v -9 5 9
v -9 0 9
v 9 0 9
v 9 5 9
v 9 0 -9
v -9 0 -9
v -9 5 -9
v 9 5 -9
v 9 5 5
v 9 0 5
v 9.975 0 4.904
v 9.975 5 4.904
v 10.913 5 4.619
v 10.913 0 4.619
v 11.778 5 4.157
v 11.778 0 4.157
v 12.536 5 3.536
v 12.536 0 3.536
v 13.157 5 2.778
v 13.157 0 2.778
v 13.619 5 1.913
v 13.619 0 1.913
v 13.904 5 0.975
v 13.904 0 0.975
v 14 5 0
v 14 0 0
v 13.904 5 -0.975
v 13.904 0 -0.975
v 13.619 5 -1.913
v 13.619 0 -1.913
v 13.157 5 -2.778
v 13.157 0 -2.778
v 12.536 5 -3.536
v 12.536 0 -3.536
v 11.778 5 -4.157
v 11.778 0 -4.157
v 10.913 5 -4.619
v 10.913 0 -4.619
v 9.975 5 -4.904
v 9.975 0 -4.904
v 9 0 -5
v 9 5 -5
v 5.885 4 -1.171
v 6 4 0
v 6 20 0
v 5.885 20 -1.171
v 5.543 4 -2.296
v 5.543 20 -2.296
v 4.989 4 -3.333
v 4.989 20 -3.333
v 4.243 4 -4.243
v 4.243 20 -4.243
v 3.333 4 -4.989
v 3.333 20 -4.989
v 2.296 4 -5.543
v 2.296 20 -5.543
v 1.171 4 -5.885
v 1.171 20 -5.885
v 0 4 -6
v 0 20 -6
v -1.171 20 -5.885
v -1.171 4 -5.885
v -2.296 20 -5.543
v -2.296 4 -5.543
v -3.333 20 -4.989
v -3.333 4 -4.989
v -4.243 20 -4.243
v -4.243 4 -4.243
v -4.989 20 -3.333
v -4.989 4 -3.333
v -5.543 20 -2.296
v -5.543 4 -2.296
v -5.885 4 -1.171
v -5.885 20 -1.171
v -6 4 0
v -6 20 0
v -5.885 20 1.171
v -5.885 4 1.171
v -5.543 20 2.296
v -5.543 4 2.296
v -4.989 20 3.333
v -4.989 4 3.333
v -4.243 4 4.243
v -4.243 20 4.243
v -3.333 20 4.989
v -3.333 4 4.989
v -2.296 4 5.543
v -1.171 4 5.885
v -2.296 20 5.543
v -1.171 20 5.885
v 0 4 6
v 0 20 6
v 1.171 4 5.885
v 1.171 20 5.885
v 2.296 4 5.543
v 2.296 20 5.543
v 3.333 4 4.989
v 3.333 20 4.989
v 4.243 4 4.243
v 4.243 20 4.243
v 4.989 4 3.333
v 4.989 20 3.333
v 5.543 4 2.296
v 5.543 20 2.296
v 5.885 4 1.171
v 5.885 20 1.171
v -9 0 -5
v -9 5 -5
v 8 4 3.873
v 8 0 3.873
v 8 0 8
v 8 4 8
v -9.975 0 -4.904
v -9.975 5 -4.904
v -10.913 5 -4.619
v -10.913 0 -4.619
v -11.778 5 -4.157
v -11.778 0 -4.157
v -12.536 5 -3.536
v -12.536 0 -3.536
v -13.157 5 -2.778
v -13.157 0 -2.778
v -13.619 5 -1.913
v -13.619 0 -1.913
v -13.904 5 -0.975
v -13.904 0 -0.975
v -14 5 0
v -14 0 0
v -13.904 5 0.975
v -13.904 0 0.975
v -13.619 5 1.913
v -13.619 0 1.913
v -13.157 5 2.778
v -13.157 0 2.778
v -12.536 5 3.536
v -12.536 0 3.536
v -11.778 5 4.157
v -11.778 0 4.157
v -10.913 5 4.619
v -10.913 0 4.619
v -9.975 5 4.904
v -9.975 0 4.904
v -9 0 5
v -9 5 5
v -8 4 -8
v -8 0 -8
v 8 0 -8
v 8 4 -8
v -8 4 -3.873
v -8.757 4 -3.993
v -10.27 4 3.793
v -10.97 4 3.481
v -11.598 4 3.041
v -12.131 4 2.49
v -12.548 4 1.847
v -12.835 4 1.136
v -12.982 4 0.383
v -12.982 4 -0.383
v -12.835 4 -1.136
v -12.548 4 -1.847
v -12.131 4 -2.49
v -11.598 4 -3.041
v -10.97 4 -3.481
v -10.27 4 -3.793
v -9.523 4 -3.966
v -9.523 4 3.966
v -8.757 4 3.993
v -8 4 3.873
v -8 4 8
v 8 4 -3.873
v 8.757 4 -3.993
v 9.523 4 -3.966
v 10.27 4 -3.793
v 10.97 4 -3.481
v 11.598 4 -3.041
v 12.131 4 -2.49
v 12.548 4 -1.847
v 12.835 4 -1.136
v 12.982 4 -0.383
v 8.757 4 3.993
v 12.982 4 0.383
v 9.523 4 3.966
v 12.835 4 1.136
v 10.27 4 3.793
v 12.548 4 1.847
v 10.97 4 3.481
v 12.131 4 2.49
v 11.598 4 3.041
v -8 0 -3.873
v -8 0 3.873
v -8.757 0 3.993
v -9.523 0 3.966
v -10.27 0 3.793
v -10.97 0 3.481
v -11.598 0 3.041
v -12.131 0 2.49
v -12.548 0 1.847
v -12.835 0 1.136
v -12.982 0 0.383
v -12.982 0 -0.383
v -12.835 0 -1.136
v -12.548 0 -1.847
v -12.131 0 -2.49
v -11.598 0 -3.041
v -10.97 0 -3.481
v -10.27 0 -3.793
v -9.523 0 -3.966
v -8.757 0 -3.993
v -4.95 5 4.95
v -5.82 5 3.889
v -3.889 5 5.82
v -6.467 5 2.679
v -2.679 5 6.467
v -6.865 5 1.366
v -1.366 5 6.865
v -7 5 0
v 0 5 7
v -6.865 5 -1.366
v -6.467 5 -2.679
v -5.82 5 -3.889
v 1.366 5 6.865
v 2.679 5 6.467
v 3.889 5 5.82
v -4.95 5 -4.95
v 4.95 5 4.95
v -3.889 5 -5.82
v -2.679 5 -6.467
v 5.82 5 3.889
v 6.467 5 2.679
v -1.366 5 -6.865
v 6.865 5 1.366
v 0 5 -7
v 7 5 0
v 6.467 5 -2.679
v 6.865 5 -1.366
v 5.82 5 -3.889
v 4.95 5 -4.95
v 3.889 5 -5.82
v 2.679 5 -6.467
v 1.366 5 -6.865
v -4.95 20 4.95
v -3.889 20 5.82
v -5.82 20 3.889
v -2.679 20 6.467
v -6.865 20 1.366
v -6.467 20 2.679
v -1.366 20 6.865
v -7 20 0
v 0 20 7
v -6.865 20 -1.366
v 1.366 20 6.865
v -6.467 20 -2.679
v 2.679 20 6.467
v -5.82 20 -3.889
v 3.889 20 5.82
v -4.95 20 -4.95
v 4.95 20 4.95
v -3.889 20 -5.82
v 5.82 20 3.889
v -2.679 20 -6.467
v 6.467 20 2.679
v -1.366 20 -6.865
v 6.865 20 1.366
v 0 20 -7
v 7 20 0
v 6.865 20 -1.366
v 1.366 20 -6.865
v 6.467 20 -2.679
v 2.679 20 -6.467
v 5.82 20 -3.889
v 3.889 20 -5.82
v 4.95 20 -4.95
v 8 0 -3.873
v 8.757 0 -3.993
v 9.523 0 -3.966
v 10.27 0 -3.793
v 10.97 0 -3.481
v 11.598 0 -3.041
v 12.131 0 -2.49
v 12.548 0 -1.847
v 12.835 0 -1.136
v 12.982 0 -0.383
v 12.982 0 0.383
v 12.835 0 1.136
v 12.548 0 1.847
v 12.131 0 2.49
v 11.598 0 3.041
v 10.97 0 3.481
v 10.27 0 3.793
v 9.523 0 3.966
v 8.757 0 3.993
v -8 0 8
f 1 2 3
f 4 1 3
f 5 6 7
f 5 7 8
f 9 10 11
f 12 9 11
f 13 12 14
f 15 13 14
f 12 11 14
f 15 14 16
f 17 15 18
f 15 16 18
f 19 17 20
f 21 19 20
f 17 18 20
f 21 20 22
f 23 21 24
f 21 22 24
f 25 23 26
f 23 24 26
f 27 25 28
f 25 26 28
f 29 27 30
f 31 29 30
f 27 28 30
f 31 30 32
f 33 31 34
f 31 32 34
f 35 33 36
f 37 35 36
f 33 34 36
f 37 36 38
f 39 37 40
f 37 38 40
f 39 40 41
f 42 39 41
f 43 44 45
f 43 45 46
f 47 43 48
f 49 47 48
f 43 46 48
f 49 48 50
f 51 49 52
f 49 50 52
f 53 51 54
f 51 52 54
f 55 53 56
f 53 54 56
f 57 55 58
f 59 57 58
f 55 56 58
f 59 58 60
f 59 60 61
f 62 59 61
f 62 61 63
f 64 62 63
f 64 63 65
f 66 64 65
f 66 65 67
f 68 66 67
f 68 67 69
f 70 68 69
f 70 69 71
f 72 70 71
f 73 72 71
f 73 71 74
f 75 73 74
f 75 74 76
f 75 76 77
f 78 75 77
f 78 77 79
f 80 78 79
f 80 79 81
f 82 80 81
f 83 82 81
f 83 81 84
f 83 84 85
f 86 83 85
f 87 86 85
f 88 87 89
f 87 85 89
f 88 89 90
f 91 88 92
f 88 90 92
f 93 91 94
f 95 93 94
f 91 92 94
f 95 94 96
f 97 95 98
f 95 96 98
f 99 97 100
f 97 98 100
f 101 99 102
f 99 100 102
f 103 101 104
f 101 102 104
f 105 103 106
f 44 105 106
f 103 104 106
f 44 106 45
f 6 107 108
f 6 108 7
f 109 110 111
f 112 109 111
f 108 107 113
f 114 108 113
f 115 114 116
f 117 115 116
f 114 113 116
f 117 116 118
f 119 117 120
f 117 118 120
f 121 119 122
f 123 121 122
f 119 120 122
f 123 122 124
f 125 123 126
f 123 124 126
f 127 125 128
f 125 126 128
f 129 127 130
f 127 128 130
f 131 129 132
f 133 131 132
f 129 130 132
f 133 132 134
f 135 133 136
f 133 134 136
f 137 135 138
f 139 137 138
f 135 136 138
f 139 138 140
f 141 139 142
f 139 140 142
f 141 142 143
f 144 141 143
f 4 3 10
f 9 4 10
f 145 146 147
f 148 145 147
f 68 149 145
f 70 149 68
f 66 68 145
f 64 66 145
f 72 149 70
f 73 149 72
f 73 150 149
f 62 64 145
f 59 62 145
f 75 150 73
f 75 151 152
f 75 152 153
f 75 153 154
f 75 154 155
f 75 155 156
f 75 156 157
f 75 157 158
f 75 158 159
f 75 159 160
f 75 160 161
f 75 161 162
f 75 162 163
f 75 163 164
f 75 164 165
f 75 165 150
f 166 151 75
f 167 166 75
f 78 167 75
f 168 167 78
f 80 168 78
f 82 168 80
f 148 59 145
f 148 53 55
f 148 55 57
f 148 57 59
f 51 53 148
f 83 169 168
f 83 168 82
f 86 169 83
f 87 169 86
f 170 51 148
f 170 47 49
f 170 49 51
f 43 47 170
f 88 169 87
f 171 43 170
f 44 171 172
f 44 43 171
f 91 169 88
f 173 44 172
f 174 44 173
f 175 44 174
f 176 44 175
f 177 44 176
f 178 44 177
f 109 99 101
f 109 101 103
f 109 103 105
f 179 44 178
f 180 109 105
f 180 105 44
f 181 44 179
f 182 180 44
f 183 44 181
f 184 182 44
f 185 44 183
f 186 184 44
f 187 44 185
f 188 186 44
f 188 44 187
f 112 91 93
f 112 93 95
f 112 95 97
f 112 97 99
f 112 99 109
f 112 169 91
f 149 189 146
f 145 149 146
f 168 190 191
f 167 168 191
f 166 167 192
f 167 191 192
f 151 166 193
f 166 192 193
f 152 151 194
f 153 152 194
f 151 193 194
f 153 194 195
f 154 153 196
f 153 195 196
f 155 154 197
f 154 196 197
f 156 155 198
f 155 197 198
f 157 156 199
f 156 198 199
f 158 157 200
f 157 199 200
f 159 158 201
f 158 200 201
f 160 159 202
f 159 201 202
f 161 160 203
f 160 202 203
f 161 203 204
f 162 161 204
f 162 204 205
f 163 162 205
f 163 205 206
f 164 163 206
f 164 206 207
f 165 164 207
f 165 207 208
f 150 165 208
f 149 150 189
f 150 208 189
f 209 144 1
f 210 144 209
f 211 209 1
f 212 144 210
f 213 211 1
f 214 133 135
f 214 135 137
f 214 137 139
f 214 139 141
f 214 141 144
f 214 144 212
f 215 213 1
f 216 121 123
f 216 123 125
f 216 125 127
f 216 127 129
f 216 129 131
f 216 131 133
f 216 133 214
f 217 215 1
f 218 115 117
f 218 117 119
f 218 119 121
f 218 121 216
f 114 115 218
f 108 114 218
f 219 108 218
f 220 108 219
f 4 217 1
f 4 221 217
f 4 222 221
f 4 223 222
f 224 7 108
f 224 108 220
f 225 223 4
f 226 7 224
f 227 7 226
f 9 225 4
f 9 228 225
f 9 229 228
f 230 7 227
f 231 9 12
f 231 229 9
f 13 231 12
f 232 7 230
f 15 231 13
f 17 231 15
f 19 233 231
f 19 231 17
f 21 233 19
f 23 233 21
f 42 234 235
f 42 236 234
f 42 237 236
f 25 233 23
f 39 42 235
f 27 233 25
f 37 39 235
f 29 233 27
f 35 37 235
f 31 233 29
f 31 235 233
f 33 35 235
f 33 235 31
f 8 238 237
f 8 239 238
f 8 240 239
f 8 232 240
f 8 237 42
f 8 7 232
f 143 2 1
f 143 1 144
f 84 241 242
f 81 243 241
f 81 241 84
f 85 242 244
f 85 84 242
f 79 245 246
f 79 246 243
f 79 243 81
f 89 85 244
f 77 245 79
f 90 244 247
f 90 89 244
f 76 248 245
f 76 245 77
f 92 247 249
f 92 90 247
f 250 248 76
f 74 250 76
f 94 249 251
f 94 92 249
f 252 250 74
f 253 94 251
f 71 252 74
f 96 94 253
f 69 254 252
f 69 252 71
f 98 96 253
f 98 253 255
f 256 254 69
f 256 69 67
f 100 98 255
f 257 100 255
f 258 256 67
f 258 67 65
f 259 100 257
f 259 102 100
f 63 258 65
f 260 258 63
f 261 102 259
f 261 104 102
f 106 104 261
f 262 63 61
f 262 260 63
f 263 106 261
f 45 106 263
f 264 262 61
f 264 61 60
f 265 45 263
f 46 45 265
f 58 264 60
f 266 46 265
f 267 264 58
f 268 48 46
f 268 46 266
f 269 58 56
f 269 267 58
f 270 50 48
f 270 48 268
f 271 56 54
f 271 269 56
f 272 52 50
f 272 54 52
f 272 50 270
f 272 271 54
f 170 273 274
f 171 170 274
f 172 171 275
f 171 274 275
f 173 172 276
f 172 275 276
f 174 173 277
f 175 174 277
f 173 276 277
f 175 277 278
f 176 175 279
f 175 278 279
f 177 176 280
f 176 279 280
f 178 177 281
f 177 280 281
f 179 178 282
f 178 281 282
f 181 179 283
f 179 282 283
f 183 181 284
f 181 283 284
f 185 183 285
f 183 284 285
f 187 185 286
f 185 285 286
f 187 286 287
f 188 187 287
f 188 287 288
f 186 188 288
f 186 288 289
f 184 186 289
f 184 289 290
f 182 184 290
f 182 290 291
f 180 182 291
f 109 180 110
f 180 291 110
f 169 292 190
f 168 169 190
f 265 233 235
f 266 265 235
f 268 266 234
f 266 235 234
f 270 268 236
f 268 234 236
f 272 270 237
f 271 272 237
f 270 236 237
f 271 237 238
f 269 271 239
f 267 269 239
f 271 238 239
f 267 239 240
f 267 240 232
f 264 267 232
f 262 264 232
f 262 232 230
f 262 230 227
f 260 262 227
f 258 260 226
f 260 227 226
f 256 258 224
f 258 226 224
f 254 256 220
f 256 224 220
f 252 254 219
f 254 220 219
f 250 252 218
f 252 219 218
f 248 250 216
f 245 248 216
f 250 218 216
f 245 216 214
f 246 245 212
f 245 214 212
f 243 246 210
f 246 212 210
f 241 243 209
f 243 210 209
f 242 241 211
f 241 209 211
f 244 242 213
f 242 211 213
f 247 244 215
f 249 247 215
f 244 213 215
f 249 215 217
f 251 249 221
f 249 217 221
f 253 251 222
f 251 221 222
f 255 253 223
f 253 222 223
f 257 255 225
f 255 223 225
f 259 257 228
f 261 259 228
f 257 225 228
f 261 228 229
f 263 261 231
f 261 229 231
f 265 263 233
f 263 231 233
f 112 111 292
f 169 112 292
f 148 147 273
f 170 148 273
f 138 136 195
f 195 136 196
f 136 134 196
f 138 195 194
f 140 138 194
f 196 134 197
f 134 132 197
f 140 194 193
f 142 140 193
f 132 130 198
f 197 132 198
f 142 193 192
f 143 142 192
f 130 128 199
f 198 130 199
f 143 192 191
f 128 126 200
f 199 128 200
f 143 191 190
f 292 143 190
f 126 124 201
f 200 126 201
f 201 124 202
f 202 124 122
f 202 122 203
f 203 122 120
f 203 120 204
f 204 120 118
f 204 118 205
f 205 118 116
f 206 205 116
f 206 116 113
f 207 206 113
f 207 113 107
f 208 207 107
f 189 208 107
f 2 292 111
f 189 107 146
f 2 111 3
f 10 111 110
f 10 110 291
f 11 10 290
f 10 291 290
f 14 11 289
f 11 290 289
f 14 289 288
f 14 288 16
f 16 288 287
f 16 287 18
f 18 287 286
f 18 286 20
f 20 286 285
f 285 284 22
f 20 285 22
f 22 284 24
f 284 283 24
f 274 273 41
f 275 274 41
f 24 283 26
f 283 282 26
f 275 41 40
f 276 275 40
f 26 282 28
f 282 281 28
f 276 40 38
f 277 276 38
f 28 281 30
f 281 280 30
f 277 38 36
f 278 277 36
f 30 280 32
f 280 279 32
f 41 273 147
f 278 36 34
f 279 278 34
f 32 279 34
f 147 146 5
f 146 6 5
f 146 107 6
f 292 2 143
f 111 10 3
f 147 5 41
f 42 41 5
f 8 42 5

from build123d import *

# Parameters (mm, degrees)
SKETCH1_W           = 18
SKETCH1_H           = 4
BOSS_EXTRUDE1_DEPTH = 5
SKETCH2_R           = 7
BOSS_EXTRUDE2_DEPTH = 15
SKETCH3_R           = 6
CUT_EXTRUDE1_DEPTH  = 21
CUT_EXTRUDE2_DEPTH  = 4


with BuildPart() as part:
    # Sketch1 → Boss-Extrude1 (new body)
    with BuildSketch(Plane(origin=(0, 0, 0), x_dir=(1, 0, 0), z_dir=(0, 1, 0))):
        with Locations((0, 7)):
            Rectangle(SKETCH1_W, SKETCH1_H)
        with Locations((0, -7)):
            Rectangle(SKETCH1_W, SKETCH1_H)
        with BuildLine():
            Line((-9, -5), (9, -5))
            ThreePointArc((9, -5), (14, 0), (9, 5))
            Line((9, 5), (-9, 5))
            ThreePointArc((-9, 5), (-14, 0), (-9, -5))
        make_face()
    extrude(amount=BOSS_EXTRUDE1_DEPTH)

    # Sketch2 → Boss-Extrude2 (add)
    with BuildSketch(Plane(origin=(0, 5, 0), x_dir=(1, 0, 0), z_dir=(0, 1, 0))):
        Circle(SKETCH2_R)
    extrude(amount=BOSS_EXTRUDE2_DEPTH)

    # Sketch3 → Cut-Extrude1 (cut, through all)
    with BuildSketch(Plane(origin=(0, 20, 0), x_dir=(1, 0, 0), z_dir=(0, 1, 0))):
        Circle(SKETCH3_R)
    extrude(amount=-CUT_EXTRUDE1_DEPTH, mode=Mode.SUBTRACT)

    # Sketch4 → Cut-Extrude2 (cut)
    with BuildSketch(Plane.XZ):
        with BuildLine():
            Line((8, -8), (8, -3.872983346))
            ThreePointArc((8, -3.872983346), (13, 0), (8, 3.872983346))
            Line((8, 3.872983346), (8, 8))
            Line((8, 8), (-8, 8))
            Line((-8, 8), (-8, 3.872983346))
            ThreePointArc((-8, 3.872983346), (-13, 0), (-8, -3.872983346))
            Line((-8, -3.872983346), (-8, -8))
            Line((-8, -8), (8, -8))
        make_face()
    extrude(amount=-CUT_EXTRUDE2_DEPTH, mode=Mode.SUBTRACT)


solid = part.part
